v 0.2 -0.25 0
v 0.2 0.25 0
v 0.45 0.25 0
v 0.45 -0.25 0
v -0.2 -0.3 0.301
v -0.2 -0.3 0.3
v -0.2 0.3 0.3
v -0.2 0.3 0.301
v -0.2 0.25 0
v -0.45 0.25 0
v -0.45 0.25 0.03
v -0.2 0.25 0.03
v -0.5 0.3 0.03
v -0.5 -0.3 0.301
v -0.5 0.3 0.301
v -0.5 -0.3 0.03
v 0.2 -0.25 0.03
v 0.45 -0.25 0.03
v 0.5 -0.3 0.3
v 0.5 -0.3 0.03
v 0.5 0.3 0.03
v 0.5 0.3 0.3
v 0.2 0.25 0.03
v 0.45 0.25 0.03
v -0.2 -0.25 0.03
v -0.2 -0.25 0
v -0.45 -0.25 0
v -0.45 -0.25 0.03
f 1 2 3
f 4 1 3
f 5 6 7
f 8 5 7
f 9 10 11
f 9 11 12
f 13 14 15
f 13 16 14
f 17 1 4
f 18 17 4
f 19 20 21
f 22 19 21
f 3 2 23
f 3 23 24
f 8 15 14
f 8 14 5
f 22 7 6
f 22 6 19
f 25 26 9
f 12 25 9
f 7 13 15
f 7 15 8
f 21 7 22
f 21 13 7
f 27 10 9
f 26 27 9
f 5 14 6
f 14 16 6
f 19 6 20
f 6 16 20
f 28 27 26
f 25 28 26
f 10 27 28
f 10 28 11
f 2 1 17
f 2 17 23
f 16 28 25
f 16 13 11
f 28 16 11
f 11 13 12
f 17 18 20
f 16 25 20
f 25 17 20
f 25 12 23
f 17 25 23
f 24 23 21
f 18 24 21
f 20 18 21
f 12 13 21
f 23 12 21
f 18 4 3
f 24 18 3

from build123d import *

# Parameters (mm, degrees)
ESQUISSE1_W  = 0.25
ESQUISSE1_H  = 0.5
PADS_DEPTH   = 0.03
PADS_2_DEPTH = 0.03
ESQUISSE2_W  = 1
ESQUISSE2_H  = 0.6
BODY_DEPTH   = 0.27
ESQUISSE3_W  = 0.3
ESQUISSE3_H  = 0.6
MARK_DEPTH   = 0.001


with BuildPart() as part:
    # Esquisse1 → pads (new body)
    with BuildSketch(Plane.XY):
        with Locations((-0.325, 0)):
            Rectangle(ESQUISSE1_W, ESQUISSE1_H)
    extrude(amount=PADS_DEPTH)



with BuildPart() as body_2:
    # Esquisse1 → pads 2 (new body)
    with BuildSketch(Plane.XY):
        with Locations((0.325, 0)):
            Rectangle(ESQUISSE1_W, ESQUISSE1_H)
    extrude(amount=PADS_2_DEPTH)


with BuildPart() as part_1:
    add(part.part)

    add(body_2.part)  # body merges body 2
    # Esquisse2 → body (add)
    with BuildSketch(Plane.XY.offset(0.03)):
        Rectangle(ESQUISSE2_W, ESQUISSE2_H)
    extrude(amount=BODY_DEPTH)

    # Esquisse3 → mark (add)
    with BuildSketch(Plane.XY.offset(0.3)):
        with Locations((-0.35, 0)):
            Rectangle(ESQUISSE3_W, ESQUISSE3_H)
    extrude(amount=MARK_DEPTH)


solid = part_1.part
